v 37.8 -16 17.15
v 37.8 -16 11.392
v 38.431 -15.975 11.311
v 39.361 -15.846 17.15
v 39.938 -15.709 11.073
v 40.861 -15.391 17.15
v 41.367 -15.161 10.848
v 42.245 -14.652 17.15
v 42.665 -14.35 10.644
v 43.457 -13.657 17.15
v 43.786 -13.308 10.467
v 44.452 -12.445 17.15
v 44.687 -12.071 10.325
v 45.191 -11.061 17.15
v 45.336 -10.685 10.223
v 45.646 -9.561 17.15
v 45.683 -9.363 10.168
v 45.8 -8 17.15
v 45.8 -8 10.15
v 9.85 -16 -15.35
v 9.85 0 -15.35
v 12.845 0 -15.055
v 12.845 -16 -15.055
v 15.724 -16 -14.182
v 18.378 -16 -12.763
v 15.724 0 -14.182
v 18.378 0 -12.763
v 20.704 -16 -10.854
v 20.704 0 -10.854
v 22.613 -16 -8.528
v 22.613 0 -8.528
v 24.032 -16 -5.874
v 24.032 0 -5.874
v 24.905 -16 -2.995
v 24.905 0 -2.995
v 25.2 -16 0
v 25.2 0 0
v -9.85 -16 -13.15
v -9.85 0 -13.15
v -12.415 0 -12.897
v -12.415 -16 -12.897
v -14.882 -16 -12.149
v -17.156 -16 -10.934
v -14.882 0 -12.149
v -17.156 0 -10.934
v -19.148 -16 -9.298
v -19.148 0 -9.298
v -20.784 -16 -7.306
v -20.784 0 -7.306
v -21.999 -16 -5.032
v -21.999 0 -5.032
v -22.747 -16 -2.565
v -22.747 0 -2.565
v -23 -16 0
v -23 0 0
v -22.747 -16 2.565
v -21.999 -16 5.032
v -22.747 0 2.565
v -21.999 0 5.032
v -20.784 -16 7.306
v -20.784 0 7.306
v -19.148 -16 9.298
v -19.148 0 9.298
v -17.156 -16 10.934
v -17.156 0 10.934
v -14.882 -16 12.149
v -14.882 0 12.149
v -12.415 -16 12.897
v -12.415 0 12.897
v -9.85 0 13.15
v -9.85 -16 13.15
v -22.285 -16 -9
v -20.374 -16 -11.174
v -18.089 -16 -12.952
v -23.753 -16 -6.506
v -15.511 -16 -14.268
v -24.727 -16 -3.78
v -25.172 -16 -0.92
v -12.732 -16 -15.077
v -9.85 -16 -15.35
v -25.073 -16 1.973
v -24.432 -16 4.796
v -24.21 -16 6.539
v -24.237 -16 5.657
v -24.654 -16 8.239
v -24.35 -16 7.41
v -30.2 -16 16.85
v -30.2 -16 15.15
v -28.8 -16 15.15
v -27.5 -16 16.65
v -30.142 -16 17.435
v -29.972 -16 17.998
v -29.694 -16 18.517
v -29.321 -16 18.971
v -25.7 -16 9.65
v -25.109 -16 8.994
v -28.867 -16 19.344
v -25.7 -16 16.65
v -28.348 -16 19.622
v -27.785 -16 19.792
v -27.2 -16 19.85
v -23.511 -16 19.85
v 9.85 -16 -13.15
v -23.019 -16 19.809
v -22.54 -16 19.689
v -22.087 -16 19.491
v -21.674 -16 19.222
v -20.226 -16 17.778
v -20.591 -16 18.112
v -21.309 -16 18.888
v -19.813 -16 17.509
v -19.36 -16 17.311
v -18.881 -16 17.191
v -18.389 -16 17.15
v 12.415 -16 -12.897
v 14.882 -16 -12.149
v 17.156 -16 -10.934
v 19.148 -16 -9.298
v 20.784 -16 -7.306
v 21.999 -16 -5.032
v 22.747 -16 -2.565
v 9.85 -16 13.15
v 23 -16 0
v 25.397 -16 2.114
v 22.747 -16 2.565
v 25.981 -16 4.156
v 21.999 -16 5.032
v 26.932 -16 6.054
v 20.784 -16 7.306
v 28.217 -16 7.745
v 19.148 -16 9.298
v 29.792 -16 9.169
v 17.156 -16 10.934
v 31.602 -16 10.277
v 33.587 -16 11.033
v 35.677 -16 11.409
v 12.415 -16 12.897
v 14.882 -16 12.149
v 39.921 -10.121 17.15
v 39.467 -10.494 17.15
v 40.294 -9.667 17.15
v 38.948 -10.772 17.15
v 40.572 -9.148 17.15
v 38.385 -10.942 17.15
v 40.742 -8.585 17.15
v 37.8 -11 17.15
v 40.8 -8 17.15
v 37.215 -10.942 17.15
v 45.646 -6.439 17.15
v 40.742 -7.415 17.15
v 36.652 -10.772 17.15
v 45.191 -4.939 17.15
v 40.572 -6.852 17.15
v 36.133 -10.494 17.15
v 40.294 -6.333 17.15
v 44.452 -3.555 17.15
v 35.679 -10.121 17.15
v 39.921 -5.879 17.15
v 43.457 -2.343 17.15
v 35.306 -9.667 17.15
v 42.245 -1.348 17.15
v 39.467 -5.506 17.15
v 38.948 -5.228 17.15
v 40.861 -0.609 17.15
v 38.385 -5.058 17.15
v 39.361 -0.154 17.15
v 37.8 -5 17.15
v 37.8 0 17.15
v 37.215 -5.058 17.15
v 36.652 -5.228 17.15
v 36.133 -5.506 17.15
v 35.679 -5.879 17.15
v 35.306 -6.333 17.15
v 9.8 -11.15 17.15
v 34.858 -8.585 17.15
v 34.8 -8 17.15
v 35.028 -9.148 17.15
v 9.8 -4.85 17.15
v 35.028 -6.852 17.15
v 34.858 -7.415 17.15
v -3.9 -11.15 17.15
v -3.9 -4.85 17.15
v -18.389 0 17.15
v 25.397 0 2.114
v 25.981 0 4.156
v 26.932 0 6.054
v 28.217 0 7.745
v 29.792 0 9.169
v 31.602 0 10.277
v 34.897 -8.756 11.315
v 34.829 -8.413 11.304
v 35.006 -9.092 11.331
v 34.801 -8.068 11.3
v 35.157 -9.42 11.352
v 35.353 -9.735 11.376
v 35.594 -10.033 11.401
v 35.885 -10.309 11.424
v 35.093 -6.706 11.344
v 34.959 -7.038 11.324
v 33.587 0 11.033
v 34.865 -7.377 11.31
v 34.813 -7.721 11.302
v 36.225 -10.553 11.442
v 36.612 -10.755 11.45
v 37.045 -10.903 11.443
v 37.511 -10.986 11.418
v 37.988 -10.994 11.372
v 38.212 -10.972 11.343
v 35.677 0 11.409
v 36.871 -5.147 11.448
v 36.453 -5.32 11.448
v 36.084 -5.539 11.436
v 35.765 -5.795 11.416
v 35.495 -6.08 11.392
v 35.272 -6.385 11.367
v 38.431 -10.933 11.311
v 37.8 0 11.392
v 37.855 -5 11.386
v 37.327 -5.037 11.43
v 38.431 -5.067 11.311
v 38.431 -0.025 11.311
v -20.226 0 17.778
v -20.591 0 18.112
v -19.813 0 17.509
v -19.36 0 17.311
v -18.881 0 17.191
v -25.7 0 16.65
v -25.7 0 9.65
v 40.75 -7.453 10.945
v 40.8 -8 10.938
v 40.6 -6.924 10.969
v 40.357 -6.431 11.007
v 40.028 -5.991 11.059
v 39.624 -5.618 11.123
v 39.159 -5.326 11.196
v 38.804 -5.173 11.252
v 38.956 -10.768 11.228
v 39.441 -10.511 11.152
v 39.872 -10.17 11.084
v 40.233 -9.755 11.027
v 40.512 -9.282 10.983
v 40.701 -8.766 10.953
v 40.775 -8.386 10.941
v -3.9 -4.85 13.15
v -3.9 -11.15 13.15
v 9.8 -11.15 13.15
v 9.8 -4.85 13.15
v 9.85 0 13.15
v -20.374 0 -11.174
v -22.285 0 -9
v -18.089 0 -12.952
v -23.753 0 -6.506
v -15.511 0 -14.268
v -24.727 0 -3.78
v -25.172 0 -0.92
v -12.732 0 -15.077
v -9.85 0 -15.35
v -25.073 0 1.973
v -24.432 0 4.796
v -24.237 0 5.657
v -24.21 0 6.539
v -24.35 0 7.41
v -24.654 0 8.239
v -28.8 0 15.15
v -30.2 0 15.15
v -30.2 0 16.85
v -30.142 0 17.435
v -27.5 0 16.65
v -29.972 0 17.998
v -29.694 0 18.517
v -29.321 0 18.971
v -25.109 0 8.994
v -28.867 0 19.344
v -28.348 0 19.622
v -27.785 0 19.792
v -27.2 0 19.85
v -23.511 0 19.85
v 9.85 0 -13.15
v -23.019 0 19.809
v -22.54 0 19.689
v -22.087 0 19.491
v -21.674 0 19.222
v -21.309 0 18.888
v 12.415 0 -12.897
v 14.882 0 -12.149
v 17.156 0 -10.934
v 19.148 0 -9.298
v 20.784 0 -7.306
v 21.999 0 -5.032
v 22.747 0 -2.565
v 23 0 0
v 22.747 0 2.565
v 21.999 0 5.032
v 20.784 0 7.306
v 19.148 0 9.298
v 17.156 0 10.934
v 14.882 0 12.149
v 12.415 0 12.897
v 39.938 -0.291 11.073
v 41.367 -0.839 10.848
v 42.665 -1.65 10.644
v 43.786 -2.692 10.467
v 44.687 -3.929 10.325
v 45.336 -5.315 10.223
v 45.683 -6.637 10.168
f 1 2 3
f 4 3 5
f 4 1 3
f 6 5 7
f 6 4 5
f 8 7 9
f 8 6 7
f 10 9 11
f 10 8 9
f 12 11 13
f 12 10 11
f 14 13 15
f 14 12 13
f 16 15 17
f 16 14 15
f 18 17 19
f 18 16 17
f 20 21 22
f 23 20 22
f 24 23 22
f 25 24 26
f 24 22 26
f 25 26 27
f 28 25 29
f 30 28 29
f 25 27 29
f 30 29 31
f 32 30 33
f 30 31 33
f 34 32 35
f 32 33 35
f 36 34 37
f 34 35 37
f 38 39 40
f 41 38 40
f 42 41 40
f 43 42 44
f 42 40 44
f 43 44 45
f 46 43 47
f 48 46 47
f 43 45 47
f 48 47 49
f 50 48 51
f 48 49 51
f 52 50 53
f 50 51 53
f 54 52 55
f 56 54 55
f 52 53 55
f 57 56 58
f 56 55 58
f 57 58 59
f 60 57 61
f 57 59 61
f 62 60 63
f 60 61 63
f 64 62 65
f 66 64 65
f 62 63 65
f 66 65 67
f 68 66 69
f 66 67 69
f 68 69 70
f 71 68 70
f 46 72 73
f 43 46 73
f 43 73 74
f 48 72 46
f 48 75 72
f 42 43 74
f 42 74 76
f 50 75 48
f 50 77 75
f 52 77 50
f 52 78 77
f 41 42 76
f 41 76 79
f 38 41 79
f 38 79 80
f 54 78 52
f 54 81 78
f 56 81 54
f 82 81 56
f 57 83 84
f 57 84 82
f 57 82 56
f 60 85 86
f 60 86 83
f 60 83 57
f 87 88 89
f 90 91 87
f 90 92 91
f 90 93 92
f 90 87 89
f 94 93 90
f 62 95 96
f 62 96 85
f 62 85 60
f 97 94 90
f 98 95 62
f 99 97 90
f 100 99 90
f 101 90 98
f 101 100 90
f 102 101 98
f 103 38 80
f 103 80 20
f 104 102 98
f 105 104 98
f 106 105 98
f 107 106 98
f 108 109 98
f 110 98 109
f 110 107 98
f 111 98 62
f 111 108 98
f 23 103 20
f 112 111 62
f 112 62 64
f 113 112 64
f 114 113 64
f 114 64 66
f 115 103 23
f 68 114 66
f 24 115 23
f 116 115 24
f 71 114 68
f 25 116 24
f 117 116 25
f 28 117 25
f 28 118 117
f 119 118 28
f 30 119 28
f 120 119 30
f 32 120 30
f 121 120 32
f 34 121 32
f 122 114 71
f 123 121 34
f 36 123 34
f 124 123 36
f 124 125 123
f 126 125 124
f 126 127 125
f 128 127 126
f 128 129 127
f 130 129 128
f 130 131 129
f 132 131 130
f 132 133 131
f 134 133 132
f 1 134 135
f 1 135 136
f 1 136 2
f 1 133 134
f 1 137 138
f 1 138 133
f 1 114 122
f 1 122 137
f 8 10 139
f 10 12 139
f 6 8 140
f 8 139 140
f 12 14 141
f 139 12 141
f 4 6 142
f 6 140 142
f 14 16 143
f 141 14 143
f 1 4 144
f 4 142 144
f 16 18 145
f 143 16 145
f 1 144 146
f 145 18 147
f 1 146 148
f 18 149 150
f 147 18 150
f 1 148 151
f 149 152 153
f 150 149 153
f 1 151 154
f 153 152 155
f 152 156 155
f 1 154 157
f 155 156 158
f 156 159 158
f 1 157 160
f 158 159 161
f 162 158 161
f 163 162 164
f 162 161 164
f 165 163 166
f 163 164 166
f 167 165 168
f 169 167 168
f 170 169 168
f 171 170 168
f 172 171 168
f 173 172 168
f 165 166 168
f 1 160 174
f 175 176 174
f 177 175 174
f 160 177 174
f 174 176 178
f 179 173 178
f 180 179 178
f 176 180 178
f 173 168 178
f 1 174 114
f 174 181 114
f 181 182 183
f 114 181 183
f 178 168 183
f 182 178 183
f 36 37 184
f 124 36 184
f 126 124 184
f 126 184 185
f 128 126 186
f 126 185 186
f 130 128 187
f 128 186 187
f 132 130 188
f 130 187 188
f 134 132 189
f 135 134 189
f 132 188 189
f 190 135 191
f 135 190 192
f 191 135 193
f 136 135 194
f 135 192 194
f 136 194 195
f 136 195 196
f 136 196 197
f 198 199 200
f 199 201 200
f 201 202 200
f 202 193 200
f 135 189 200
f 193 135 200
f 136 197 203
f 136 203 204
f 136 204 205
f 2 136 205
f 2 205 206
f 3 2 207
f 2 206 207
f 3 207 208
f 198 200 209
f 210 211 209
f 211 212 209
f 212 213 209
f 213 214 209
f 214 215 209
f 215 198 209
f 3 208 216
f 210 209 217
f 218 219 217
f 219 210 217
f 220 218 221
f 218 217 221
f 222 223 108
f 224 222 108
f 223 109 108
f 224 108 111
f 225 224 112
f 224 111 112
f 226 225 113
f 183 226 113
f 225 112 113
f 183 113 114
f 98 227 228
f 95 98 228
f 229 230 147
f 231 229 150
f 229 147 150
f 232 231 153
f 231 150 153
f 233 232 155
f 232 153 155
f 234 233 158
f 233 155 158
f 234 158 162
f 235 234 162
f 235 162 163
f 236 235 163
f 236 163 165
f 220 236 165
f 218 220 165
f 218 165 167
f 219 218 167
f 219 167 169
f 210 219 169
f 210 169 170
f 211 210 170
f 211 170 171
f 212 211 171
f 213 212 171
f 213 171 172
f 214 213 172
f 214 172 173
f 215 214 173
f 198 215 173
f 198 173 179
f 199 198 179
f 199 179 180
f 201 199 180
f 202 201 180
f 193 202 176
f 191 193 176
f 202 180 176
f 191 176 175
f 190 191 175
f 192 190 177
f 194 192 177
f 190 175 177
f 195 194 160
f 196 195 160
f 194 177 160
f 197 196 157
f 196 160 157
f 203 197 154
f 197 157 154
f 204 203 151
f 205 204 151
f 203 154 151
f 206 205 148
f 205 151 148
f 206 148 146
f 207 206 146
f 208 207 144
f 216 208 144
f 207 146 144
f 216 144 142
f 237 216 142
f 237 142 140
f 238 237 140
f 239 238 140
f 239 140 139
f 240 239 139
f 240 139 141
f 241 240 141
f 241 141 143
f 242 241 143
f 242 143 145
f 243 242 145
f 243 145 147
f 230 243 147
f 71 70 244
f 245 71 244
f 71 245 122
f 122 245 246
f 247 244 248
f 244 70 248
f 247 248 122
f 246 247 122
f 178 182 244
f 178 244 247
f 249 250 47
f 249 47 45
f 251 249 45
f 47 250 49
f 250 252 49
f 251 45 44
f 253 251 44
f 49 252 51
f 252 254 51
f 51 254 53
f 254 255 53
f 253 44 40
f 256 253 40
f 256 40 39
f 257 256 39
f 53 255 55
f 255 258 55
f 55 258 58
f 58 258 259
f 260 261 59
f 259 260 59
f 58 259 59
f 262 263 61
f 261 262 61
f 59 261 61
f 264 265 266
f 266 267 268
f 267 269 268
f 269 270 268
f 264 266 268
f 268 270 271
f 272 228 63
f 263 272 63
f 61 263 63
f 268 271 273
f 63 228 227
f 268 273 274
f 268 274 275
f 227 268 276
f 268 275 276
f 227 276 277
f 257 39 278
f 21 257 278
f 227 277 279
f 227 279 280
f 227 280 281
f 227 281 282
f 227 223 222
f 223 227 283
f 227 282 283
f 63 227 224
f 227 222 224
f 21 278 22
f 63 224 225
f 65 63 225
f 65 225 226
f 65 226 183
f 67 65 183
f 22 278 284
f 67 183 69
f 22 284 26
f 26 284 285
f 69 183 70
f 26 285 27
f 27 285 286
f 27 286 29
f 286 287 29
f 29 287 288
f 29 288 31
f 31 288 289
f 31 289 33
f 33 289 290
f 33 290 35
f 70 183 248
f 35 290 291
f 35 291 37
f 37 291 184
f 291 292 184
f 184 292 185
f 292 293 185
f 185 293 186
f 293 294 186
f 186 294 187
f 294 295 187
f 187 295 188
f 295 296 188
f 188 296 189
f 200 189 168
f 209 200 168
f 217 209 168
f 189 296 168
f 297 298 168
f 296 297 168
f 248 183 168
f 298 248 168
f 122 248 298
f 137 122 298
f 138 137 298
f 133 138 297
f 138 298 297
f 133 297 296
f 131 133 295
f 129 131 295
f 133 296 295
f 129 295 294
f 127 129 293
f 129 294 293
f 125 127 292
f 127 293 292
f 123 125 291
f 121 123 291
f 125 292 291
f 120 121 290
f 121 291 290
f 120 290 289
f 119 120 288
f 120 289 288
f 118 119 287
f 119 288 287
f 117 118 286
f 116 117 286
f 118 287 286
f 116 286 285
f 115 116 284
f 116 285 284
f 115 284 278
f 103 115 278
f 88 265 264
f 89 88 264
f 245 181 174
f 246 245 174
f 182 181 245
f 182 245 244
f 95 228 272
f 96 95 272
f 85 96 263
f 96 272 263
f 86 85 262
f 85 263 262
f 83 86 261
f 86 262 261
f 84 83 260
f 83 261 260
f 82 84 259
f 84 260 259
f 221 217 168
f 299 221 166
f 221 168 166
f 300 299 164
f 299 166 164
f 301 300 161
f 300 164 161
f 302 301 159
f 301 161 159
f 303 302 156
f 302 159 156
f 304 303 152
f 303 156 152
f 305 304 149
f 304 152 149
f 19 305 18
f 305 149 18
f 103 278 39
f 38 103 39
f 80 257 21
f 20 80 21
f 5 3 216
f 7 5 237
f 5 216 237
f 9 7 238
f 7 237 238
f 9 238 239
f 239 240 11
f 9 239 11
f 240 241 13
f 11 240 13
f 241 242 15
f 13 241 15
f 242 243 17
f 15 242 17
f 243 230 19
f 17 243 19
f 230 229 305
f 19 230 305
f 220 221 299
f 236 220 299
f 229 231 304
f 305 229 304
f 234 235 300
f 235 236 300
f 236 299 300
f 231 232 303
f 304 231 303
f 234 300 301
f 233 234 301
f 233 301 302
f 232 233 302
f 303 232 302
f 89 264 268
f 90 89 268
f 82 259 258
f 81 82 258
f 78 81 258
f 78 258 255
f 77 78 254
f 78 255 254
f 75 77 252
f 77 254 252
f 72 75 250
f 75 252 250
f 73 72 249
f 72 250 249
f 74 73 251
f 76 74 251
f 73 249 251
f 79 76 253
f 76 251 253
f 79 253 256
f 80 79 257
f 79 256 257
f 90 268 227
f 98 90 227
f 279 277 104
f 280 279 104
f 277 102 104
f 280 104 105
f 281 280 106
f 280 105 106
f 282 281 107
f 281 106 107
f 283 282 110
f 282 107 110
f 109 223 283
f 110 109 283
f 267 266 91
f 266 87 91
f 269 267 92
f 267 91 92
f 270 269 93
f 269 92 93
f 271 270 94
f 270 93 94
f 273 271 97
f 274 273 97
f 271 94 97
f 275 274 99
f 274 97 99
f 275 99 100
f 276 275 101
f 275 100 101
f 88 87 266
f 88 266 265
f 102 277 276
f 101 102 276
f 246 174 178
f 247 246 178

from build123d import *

# Parameters (mm, degrees)
F1_DEPTH = 16
F2_R     = 3
F3_R     = 7.99999
F4_R     = 3
F4_W     = 13.7
F4_H     = 6.3
F5_DEPTH = 10


# Not quite as in the source:
# - a fillet or chamfer is up to 0.001 mm smaller than in the source, because OpenCascade refuses the exact size


with BuildPart() as f1:
    # F0 (on Front) → F1 (new body)
    with BuildSketch(Plane.XZ):
        with BuildLine():
            ThreePointArc((-25.7, 9.65), (-24.3502481093, 7.4100162997), (-24.4315048785, 4.7960624973))
            ThreePointArc((-24.4315048785, 4.7960624973), (-22.2846704688, -9.0000816848), (-9.85, -15.35))
            Line((-9.85, -15.35), (9.85, -15.35))
            ThreePointArc((9.85, -15.35), (20.7040890912, -10.8540890912), (25.2, 0))
            ThreePointArc((25.2, 0), (29.210075991, 8.7034493587), (38.4314464174, 11.3105680079))
            Line((38.4314464174, 11.3105680079), (45.8, 10.15))
            Line((45.8, 10.15), (45.8, 17.15))
            Line((45.8, 17.15), (-19.7, 17.15))
            Line((-19.7, 17.15), (-22.2, 19.85))
            Line((-22.2, 19.85), (-30.2, 19.85))
            Line((-30.2, 19.85), (-30.2, 15.15))
            Line((-30.2, 15.15), (-28.8, 15.15))
            Line((-28.8, 15.15), (-27.5, 16.65))
            Line((-27.5, 16.65), (-25.7, 16.65))
            Line((-25.7, 16.65), (-25.7, 9.65))
        make_face()
        with BuildLine():
            ThreePointArc((-9.85, -13.15), (-23, 0), (-9.85, 13.15))
            Line((-9.85, 13.15), (9.85, 13.15))
            ThreePointArc((9.85, 13.15), (23, 0), (9.85, -13.15))
            Line((9.85, -13.15), (-9.85, -13.15))
        make_face(mode=Mode.SUBTRACT)
    extrude(amount=F1_DEPTH)

    # F2
    f2_edges = [f1.edges().sort_by_distance(p)[0] for p in [
        (-30.2, -8, 19.85),
        (-22.2, -8, 19.85),
        (-19.7, -8, 17.15),
    ]]
    fillet(f2_edges, radius=F2_R)

    # F3 (radius 8 in the source; OpenCascade refuses exactly that, so slightly less here)
    f3_edges = [f1.edges().sort_by_distance(p)[0] for p in [
        (45.8, -16, 13.65),
        (45.8, 0, 13.65),
    ]]
    fillet(f3_edges, radius=F3_R)

    # F4 (on face) → F5 (cut)
    with BuildSketch(Plane.XY.offset(17.15)):
        with Locations((37.8, -8)):
            Circle(F4_R)
        with Locations((2.95, -8)):
            Rectangle(F4_W, F4_H)
    extrude(amount=-F5_DEPTH, mode=Mode.SUBTRACT)


solid = f1.part
